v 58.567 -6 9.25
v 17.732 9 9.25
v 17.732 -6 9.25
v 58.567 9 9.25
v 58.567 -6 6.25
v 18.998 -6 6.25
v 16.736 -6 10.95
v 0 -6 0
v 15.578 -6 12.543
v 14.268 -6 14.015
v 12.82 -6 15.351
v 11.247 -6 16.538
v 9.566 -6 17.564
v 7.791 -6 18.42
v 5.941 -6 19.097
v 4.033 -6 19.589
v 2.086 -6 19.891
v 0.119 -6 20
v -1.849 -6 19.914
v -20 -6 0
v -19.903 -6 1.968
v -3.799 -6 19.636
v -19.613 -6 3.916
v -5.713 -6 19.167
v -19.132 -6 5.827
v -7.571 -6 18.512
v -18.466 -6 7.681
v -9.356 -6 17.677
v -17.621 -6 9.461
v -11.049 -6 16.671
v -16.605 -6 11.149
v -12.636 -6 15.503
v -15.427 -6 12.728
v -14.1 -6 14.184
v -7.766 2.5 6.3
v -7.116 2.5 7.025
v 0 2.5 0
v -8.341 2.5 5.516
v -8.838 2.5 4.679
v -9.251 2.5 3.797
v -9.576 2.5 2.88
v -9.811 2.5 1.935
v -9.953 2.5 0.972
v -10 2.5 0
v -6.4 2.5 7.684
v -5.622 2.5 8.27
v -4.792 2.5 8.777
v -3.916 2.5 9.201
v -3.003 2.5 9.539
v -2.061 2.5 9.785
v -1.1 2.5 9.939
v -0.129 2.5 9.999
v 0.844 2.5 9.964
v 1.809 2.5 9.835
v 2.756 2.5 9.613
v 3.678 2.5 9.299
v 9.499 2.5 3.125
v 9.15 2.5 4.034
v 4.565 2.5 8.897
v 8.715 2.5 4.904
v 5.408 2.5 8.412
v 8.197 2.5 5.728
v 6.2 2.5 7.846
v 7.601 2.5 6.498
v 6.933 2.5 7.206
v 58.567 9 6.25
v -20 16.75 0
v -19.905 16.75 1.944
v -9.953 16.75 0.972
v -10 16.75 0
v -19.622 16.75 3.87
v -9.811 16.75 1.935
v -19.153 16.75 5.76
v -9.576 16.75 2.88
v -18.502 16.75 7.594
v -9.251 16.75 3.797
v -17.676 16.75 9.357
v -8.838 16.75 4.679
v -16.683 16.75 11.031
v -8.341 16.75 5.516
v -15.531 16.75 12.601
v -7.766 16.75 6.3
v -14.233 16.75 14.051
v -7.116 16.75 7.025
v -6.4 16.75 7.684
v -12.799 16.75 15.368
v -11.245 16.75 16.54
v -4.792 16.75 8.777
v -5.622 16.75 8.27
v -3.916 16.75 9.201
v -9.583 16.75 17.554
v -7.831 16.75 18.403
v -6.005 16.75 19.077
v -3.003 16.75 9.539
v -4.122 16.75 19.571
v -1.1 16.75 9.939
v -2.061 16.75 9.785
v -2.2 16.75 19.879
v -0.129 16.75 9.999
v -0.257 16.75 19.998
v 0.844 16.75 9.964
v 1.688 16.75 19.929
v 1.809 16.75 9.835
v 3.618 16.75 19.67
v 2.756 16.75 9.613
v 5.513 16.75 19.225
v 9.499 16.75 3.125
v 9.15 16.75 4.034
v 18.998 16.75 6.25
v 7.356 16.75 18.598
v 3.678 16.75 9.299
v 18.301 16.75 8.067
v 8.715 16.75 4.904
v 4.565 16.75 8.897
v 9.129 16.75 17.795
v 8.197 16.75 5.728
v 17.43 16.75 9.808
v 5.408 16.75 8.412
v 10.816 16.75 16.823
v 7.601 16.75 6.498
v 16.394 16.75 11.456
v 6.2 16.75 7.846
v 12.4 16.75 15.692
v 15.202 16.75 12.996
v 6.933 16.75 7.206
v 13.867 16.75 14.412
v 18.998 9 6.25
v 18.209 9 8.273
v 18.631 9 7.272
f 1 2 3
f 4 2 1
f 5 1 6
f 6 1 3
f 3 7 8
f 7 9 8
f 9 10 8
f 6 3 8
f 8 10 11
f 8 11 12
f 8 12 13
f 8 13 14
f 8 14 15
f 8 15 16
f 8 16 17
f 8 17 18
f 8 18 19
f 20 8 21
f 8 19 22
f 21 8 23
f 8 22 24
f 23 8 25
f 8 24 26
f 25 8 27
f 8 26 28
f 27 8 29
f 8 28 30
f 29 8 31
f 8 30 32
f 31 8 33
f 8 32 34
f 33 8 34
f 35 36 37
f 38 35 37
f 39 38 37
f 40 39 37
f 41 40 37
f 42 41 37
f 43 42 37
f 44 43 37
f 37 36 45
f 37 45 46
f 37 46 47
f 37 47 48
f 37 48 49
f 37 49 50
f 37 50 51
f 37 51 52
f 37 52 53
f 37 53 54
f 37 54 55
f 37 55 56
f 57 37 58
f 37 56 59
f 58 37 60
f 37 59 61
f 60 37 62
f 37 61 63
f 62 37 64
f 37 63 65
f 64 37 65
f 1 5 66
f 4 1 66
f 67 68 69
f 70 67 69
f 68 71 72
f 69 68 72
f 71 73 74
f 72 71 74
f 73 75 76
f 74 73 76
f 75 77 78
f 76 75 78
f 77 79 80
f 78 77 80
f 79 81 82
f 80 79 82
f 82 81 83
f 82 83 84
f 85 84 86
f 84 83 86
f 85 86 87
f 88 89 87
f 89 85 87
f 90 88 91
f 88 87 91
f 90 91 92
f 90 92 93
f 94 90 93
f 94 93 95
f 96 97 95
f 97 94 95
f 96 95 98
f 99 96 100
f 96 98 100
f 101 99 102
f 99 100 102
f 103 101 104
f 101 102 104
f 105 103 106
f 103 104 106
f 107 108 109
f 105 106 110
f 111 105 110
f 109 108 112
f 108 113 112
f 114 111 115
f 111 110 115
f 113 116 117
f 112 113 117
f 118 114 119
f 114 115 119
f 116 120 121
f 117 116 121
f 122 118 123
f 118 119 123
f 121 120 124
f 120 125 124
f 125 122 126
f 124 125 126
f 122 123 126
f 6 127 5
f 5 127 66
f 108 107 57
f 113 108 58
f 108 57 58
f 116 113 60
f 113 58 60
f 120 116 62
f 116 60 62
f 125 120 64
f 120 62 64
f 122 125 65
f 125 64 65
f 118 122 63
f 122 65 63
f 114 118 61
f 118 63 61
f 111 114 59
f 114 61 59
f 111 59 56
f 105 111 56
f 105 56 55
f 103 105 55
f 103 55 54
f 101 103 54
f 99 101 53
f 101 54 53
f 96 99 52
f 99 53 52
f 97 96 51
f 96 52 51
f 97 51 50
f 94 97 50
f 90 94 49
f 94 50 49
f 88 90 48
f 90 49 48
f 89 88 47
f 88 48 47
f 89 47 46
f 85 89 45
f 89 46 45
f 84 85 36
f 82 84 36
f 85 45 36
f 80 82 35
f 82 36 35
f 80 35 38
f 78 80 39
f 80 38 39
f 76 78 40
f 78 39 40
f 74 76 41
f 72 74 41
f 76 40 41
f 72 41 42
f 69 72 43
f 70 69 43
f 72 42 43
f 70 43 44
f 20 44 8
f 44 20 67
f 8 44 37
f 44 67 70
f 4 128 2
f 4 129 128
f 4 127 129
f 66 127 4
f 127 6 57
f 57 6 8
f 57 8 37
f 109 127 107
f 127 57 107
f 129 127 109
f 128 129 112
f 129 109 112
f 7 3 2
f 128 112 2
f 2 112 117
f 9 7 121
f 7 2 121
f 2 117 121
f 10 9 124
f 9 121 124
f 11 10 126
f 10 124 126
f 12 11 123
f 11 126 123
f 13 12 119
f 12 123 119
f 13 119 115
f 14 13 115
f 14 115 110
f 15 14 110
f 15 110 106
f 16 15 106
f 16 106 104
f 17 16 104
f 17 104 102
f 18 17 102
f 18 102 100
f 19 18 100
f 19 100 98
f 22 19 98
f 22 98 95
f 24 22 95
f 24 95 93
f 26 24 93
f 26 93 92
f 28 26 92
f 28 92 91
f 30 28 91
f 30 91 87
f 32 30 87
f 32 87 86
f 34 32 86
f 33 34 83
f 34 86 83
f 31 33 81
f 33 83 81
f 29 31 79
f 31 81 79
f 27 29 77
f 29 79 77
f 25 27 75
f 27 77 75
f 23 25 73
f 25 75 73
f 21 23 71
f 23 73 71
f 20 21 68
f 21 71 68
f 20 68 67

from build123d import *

# Parameters (mm, degrees)
SKETCH1_W              = 2.756398936
SKETCH1_H              = 15
REVOLVE2_ANGLE         = 180
BOSS_EXTRUDE1_START    = 6.25
SKETCH1_7_W            = 41.323169176
SKETCH1_7_H            = 15
BOSS_EXTRUDE1_DEPTH    = 3
CUT_REVOLVE2_START     = -9.499177596
CUT_REVOLVE2_OUTLINE_W = 22.75
CUT_REVOLVE2_OUTLINE_H = 7
CUT_REVOLVE2_DEPTH     = 29.499177596


with BuildPart() as part:
    # Sketch1 → Revolve2 (revolve)
    with BuildSketch(Plane.XY):
        Polygon((17.243601064, 9), (20, 9), (20, 16.75), (10, 16.75), (10, 2.5), (0, 2.5), (0, -6), (17.243601064, -6), align=None)
        with Locations((18.621800532, 1.5)):
            Rectangle(SKETCH1_W, SKETCH1_H)
    revolve(axis=Axis((0, 2.5, 0), (0, -1, 0)), revolution_arc=REVOLVE2_ANGLE)

    # Sketch1<7> → Boss-Extrude1 (add)
    with BuildSketch(Plane.XY.offset(BOSS_EXTRUDE1_START)):
        with Locations((37.905185652, 1.5)):
            Rectangle(SKETCH1_7_W, SKETCH1_7_H)
    extrude(amount=BOSS_EXTRUDE1_DEPTH)

    # Cut-Revolve2: read off the stored shape, not the designer's step
    # Cut-Revolve2 outline → Cut-Revolve2 (cut)
    with BuildSketch(Plane(origin=(0, 0, 0), x_dir=(0, 1, 0), z_dir=(0.9499177595981665, 0, 0.31250000000000017)).offset(CUT_REVOLVE2_START)):
        with Locations((5.375, -3.5)):
            Rectangle(CUT_REVOLVE2_OUTLINE_W, CUT_REVOLVE2_OUTLINE_H)
    extrude(amount=CUT_REVOLVE2_DEPTH, mode=Mode.SUBTRACT)


solid = part.part
